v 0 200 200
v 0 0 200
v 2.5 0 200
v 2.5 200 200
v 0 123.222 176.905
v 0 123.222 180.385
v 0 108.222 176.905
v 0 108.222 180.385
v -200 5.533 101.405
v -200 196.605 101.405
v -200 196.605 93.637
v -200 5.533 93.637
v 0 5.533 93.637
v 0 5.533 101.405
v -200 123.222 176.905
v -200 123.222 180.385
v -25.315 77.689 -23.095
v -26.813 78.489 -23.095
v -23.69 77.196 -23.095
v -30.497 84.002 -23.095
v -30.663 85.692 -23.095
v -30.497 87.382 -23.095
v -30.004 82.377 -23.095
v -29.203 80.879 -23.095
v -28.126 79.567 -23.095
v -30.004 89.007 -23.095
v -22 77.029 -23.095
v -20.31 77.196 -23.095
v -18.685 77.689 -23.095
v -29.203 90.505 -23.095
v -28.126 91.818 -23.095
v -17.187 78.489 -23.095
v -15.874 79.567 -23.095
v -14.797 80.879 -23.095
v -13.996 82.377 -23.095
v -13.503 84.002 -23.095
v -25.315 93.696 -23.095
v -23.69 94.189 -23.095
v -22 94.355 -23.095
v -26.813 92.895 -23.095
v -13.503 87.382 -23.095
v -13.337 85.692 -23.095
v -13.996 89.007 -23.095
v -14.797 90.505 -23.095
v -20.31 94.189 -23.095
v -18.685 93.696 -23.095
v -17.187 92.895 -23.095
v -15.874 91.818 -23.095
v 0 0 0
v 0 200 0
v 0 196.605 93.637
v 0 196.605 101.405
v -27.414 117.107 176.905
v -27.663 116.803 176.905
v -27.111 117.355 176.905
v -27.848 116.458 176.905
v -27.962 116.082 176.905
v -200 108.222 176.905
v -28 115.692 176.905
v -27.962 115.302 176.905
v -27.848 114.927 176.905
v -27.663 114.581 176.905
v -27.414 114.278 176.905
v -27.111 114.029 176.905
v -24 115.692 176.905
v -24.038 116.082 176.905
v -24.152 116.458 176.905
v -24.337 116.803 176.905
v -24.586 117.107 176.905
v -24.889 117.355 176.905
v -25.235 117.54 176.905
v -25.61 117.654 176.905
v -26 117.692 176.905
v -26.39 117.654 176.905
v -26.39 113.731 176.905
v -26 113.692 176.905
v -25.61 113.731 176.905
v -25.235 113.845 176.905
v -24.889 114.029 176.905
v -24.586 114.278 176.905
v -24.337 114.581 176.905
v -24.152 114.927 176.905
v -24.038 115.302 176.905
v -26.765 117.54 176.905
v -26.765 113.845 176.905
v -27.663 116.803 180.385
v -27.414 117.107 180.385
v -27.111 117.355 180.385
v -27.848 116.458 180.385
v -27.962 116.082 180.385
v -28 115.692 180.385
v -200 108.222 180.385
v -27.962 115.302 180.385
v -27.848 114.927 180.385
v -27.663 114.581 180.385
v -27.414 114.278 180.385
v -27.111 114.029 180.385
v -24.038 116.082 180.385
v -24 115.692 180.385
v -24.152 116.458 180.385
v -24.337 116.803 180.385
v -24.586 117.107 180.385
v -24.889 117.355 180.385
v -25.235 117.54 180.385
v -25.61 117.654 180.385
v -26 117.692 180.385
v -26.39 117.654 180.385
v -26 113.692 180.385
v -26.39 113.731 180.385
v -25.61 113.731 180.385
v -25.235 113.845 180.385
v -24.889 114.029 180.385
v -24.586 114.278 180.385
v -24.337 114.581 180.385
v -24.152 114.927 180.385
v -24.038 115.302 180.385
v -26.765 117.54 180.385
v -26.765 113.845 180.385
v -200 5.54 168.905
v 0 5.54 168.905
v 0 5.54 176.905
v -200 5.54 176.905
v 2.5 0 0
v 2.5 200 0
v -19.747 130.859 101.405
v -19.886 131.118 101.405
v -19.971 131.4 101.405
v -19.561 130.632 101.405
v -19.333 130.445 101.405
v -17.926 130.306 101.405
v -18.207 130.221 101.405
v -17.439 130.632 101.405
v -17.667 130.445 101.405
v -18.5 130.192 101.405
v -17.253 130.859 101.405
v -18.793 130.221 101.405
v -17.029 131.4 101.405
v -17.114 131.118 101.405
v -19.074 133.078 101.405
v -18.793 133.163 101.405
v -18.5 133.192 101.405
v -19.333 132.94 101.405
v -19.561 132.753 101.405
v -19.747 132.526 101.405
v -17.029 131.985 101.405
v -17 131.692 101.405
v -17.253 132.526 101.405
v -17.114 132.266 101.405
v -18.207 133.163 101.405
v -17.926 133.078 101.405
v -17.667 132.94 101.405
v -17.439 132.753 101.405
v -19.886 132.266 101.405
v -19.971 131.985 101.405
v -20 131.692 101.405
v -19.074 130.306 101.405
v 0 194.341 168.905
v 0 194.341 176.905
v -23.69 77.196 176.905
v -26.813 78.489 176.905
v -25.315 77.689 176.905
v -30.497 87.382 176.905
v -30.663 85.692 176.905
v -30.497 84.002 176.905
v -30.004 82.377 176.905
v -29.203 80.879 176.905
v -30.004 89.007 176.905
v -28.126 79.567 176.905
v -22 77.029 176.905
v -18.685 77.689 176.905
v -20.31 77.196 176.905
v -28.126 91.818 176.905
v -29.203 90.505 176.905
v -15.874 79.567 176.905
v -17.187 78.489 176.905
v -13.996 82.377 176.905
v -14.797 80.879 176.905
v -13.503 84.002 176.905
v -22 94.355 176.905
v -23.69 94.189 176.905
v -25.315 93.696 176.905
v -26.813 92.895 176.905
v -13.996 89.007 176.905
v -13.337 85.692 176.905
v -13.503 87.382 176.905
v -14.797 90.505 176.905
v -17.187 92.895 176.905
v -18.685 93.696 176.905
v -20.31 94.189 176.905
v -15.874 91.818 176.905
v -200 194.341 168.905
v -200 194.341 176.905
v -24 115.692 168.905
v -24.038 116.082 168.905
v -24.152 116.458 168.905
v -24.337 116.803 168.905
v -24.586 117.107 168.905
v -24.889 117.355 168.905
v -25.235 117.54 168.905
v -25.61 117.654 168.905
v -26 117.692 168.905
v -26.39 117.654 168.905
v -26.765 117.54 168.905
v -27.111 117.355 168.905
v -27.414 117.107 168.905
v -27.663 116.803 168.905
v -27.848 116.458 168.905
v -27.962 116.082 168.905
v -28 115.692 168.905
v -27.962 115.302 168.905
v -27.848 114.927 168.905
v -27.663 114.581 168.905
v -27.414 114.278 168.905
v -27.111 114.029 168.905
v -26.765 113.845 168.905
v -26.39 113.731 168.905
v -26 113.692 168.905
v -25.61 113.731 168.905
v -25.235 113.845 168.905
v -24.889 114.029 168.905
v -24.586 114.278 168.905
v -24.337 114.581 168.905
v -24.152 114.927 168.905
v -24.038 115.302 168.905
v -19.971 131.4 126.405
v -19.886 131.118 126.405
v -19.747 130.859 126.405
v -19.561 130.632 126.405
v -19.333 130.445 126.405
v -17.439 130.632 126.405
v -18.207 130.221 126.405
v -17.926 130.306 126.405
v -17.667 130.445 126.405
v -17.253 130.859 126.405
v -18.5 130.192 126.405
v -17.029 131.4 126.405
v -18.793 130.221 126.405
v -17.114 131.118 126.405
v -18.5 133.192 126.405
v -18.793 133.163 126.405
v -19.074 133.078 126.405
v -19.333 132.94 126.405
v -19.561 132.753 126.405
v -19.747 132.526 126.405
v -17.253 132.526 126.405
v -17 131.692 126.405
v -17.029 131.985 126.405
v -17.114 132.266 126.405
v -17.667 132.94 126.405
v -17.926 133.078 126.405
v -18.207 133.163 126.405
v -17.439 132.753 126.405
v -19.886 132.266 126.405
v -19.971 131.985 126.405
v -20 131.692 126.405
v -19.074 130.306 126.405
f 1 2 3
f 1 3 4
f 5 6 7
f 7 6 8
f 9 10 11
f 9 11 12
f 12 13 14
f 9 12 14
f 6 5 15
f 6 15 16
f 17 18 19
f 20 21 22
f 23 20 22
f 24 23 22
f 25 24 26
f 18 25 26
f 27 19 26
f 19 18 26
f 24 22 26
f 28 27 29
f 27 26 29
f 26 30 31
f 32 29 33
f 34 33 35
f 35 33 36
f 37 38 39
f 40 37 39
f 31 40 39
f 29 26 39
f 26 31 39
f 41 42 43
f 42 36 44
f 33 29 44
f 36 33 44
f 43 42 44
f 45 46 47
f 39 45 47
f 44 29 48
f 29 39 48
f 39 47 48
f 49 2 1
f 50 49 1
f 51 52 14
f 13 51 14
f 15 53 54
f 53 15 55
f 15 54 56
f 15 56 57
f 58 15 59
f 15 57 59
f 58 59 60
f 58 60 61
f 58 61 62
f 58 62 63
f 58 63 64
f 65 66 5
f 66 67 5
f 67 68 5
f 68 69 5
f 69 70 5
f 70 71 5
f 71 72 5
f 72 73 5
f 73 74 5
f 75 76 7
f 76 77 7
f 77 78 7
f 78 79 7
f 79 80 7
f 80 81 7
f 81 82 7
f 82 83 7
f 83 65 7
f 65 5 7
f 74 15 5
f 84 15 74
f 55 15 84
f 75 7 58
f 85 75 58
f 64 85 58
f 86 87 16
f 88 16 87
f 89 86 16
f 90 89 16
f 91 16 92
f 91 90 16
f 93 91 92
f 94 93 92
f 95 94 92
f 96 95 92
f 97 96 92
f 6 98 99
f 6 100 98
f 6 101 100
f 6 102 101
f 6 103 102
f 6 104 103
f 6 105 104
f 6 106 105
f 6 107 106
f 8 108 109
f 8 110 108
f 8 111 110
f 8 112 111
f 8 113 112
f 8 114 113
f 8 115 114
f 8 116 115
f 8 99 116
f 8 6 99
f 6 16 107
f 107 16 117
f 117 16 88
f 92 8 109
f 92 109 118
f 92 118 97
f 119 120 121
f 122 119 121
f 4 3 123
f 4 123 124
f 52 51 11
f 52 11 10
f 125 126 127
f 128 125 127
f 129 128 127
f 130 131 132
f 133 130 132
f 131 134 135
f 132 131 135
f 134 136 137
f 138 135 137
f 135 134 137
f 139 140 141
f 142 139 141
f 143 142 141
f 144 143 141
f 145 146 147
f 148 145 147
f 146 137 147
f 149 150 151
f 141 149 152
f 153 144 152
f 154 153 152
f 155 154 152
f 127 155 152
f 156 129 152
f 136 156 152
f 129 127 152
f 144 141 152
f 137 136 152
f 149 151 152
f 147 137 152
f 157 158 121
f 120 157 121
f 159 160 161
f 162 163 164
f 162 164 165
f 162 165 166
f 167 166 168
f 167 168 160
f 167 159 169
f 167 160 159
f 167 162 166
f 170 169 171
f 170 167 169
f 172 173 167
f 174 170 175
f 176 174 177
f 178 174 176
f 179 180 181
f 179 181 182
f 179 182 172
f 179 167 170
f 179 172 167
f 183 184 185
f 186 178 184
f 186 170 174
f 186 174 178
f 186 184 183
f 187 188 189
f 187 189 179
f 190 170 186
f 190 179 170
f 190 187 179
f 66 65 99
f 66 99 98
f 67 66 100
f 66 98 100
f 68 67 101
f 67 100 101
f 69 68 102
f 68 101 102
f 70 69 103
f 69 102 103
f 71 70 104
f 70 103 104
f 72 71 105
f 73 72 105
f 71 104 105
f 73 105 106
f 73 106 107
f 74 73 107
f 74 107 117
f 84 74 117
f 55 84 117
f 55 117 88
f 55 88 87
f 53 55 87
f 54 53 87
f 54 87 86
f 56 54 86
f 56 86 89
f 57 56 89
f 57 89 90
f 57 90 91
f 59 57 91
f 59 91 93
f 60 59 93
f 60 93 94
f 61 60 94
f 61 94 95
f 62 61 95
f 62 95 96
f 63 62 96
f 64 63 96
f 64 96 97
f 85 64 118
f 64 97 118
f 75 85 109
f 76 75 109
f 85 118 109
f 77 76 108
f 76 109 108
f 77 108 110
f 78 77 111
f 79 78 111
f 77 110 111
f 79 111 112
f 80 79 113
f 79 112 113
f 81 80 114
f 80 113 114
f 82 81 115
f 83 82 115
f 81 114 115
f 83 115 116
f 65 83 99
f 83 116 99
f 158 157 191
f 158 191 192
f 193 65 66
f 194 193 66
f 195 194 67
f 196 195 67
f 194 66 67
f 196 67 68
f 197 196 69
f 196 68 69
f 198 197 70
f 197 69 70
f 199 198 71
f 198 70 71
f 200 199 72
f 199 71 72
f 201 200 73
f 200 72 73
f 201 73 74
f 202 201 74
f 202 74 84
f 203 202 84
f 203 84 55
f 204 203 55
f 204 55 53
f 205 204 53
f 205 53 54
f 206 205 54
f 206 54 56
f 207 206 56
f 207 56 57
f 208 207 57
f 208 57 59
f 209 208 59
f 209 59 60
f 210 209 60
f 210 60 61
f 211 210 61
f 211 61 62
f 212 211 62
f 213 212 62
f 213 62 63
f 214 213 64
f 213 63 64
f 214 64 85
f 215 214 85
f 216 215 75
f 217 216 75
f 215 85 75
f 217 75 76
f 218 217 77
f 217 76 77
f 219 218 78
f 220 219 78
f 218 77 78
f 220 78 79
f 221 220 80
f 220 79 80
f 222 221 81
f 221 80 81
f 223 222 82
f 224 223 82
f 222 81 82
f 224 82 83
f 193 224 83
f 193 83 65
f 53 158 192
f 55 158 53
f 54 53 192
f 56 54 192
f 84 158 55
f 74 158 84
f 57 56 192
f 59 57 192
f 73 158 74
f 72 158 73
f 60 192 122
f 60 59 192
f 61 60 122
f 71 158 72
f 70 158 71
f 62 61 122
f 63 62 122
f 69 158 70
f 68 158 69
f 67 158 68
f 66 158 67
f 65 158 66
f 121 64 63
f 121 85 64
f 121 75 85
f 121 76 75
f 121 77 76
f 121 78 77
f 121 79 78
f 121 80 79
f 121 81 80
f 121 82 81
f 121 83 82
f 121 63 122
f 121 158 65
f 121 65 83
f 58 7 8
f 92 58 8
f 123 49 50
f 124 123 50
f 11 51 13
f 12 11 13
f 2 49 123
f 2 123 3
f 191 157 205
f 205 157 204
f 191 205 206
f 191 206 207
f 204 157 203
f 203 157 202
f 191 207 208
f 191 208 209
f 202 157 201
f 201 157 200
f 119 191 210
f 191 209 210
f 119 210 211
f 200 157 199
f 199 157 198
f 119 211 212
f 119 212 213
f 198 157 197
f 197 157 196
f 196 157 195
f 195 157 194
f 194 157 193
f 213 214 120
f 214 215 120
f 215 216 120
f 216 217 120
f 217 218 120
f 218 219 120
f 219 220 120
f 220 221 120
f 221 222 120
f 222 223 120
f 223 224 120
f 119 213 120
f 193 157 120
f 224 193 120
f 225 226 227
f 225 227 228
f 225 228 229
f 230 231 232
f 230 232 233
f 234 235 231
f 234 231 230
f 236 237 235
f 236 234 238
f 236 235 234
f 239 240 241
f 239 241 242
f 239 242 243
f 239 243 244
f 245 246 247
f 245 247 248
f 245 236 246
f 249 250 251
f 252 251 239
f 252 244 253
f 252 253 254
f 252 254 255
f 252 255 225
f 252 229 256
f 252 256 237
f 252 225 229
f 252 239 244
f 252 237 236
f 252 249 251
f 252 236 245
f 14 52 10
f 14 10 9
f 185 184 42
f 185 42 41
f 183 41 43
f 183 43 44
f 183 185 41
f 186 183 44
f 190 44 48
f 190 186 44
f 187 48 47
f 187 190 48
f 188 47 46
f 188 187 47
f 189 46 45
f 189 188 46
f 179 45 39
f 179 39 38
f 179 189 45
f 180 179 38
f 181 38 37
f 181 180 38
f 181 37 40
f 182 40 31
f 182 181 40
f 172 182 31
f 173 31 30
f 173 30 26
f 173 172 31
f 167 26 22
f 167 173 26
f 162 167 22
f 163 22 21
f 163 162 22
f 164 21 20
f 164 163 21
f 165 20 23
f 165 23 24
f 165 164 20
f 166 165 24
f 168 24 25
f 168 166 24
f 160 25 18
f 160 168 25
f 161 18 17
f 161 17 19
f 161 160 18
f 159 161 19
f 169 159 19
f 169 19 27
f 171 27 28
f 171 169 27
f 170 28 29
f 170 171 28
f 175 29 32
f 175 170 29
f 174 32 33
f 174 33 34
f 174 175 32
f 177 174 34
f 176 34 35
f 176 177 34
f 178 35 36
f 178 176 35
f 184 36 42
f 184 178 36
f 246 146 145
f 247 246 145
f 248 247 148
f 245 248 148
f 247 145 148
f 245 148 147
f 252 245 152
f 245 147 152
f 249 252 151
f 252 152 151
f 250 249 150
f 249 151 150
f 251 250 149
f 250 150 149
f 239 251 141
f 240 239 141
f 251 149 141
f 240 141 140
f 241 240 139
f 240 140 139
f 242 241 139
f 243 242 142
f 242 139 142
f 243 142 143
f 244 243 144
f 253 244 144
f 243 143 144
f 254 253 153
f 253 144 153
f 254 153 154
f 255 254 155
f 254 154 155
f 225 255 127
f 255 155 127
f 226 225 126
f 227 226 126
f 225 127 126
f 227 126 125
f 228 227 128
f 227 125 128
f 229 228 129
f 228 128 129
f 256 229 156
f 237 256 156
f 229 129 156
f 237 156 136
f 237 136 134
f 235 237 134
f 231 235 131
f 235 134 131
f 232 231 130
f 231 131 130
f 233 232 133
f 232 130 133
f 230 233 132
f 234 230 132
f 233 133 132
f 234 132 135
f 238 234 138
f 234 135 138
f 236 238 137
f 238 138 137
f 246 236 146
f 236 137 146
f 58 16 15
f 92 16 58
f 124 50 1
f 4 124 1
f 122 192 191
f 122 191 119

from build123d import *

# Parameters (mm, degrees)
F0_W      = 200
F0_H      = 200
F1_DEPTH  = 2.5
F2_W      = 15
F2_H      = 3.479437
F3_DEPTH  = 200
F4_W      = 188.801
F4_H      = 8
F5_DEPTH  = 200
F6_R      = 2
F7_DEPTH  = 180.385741
F8_R      = 8.663
F9_DEPTH  = 200
F10_W     = 191.071827
F10_H     = 7.76824
F11_DEPTH = 200
F12_R     = 1.5
F13_DEPTH = 25


with BuildPart() as f1:
    # F0 (on Right) → F1 (new body)
    with BuildSketch(Plane.YZ):
        with Locations((100, 100)):
            Rectangle(F0_W, F0_H)
    extrude(amount=F1_DEPTH)


with BuildPart() as f3:
    # F2 (on face) → F3 (new body)
    with BuildSketch(Plane(origin=(0, 0, 0), x_dir=(0, -1, 0), z_dir=(-1, 0, 0))):
        with Locations((-115.722087, 178.645022)):
            Rectangle(F2_W, F2_H)
    extrude(amount=F3_DEPTH)


with BuildPart() as f5:
    # F4 (on face) → F5 (new body)
    with BuildSketch(Plane(origin=(0, 0, 0), x_dir=(0, -1, 0), z_dir=(-1, 0, 0))):
        with Locations((-99.940425, 172.905304)):
            Rectangle(F4_W, F4_H)
    extrude(amount=F5_DEPTH)


with BuildPart() as f7_tool:
    # F6 (on face) → F7 (new body, through all)
    with BuildSketch(Plane.XY.offset(180.384741)):
        with Locations((-26, 115.69231)):
            Circle(F6_R)
    extrude(amount=-F7_DEPTH)


with BuildPart() as f3_1:
    add(f3.part)

    # F7: cut by f7_tool
    add(f7_tool.part, mode=Mode.SUBTRACT)


with BuildPart() as f5_1:
    add(f5.part)

    # F7: cut by f7_tool
    add(f7_tool.part, mode=Mode.SUBTRACT)


with BuildPart() as f9:
    # F8 (on face) → F9 (new body)
    with BuildSketch(Plane.XY.offset(176.905304)):
        with Locations((-22, 85.69231)):
            Circle(F8_R)
    extrude(amount=-F9_DEPTH)


with BuildPart() as f11:
    # F10 (on face) → F11 (new body)
    with BuildSketch(Plane(origin=(0, 0, 0), x_dir=(0, -1, 0), z_dir=(-1, 0, 0))):
        with Locations((-101.068939, 97.521184)):
            Rectangle(F10_W, F10_H)
    extrude(amount=F11_DEPTH)


with BuildPart() as f13:
    # F12 (on face) → F13 (new body)
    with BuildSketch(Plane.XY.offset(101.405304)):
        with Locations((-18.5, 131.69231)):
            Circle(F12_R)
    extrude(amount=F13_DEPTH)


solid = Compound([f1.part, f3_1.part, f5_1.part, f9.part, f11.part, f13.part])
